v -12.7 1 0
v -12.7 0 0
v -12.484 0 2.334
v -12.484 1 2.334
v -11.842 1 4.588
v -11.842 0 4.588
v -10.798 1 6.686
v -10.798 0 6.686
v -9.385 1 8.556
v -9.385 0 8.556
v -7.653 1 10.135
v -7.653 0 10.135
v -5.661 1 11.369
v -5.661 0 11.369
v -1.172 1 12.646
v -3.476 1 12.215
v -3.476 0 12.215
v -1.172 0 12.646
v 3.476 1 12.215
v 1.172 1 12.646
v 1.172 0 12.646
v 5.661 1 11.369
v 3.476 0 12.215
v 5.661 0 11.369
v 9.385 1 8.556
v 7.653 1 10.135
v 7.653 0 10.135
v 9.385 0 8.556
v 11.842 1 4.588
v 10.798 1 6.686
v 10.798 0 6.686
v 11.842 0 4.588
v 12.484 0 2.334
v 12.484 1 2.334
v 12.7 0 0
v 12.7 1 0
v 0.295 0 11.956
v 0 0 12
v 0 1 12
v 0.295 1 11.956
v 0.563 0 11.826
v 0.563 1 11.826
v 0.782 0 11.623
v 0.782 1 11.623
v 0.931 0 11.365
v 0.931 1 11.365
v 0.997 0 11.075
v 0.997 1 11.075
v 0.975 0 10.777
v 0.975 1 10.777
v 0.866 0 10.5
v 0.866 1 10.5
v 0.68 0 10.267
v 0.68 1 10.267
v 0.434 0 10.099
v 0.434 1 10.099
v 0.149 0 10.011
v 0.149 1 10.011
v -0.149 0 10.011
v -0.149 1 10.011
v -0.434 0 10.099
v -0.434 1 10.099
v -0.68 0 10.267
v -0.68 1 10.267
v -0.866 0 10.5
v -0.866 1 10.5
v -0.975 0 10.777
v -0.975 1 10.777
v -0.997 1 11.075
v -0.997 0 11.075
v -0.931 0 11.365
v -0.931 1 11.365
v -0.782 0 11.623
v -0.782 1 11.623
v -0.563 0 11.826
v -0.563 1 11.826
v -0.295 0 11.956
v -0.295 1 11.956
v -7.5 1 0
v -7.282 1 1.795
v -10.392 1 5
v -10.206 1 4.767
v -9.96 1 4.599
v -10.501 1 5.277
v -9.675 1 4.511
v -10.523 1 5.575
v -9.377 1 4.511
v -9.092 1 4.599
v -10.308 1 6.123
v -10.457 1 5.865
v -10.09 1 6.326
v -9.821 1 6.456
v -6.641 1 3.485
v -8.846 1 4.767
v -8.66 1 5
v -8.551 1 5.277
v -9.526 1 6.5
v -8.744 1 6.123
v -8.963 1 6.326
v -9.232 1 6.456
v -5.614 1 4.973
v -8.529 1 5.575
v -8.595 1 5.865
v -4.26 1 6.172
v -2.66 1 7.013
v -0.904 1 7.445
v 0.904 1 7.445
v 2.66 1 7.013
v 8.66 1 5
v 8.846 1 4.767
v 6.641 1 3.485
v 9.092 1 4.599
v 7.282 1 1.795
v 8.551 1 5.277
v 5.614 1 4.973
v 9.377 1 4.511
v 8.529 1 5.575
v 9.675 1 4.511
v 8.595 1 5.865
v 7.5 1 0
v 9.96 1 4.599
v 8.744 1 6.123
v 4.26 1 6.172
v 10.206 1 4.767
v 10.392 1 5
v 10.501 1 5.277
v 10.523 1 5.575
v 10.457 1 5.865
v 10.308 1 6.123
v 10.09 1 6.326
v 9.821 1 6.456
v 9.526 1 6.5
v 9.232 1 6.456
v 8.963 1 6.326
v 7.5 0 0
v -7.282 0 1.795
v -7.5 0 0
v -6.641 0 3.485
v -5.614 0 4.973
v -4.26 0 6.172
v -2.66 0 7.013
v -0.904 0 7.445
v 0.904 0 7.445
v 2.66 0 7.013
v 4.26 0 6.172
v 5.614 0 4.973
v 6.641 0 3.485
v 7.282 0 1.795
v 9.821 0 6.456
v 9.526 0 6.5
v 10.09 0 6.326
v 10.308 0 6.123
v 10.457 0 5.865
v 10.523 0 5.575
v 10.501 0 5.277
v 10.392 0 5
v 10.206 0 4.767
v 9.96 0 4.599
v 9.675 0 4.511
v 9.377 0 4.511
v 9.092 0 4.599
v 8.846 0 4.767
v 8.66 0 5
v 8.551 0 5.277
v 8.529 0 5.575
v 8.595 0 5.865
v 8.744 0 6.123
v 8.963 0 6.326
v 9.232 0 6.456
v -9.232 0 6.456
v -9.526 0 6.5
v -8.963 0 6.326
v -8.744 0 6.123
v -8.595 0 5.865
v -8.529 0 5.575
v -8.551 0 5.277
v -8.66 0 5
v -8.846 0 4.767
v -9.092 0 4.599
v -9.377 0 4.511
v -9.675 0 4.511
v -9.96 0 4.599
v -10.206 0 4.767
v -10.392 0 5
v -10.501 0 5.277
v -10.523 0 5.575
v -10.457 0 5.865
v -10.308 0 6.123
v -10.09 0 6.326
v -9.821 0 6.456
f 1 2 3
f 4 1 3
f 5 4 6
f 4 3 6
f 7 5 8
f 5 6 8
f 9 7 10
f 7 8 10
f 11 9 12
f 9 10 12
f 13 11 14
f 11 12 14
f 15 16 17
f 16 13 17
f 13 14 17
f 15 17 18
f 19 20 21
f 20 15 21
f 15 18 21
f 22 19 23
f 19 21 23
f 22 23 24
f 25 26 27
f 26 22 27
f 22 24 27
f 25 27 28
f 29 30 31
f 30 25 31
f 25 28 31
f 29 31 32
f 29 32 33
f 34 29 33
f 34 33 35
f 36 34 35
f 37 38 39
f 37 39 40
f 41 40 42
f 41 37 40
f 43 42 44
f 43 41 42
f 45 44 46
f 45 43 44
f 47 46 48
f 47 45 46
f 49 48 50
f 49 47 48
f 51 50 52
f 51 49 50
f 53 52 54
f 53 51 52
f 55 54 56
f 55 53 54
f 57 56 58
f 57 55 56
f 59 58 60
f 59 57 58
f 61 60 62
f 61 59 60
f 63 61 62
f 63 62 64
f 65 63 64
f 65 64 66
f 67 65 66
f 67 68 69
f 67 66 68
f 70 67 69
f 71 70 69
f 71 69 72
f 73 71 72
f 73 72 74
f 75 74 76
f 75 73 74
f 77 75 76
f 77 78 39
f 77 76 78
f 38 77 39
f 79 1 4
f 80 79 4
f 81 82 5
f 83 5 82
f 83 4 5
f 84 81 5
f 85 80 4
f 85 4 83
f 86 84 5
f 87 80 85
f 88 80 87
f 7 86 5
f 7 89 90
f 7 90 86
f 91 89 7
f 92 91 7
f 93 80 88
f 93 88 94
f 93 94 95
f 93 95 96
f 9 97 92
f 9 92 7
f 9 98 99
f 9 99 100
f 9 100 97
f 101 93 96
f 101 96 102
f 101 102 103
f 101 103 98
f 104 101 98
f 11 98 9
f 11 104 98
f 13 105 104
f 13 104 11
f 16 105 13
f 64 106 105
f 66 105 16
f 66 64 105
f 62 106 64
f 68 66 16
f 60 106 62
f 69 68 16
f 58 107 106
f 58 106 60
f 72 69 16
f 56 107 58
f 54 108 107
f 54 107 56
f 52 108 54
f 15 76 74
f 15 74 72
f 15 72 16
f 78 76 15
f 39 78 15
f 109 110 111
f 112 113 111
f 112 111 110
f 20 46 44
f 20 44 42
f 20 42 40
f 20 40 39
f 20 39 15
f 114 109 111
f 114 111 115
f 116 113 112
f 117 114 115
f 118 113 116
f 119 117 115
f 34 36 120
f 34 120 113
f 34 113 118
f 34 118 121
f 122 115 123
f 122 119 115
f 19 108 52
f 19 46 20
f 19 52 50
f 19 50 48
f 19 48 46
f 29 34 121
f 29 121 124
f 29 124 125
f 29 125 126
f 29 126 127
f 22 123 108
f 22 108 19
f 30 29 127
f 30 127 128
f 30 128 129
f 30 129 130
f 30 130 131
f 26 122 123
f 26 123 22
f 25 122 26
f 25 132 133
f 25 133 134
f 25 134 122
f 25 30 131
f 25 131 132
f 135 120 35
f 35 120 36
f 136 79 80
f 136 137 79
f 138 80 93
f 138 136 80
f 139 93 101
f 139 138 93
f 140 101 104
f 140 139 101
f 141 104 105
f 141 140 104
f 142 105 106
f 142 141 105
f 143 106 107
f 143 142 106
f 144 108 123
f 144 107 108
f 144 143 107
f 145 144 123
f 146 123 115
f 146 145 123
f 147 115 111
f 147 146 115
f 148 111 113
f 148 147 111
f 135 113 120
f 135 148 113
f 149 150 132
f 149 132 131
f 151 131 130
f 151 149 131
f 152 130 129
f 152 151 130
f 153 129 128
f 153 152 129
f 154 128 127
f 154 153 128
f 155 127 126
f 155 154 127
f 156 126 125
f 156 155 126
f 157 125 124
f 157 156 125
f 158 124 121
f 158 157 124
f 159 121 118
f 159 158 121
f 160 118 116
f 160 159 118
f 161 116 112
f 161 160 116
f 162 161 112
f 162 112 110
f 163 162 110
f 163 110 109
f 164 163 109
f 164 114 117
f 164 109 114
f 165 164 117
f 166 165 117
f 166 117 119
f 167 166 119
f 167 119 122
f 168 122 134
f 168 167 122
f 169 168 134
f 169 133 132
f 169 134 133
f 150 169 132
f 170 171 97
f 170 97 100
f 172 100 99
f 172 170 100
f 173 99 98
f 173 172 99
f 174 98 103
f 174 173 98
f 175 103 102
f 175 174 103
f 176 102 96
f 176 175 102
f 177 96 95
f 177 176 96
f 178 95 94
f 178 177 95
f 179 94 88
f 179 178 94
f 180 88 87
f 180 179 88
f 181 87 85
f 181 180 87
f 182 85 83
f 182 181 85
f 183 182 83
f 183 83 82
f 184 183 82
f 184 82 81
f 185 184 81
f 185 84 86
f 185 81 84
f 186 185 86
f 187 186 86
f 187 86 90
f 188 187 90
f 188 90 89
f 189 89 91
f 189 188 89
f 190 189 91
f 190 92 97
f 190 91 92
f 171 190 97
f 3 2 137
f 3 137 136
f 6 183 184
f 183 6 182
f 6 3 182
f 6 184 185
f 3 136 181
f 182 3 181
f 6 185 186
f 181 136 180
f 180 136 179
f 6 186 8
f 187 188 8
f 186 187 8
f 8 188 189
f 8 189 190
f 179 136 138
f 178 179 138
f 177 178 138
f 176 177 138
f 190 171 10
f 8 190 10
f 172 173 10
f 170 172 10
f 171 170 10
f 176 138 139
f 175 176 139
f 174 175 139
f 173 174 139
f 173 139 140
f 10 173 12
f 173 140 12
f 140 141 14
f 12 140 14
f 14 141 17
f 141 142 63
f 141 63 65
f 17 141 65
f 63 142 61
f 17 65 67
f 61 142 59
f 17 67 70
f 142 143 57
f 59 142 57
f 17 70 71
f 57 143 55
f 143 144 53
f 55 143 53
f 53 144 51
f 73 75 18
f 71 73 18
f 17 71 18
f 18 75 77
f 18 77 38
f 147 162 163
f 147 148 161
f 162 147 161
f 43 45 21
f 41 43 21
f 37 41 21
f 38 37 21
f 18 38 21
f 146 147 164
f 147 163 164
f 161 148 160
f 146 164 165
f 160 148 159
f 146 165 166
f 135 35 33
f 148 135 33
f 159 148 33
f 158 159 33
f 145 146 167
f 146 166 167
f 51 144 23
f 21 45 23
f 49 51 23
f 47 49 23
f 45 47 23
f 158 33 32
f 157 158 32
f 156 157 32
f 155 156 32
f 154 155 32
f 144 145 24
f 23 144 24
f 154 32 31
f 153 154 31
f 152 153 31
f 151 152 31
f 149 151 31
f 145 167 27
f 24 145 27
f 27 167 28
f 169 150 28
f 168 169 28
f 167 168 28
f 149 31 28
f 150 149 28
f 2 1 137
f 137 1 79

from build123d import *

# Parameters (mm, degrees)
SKETCH1_R               = 12.7
BOSS_EXTRUDE1_DEPTH     = 1
CUT_EXTRUDE1_DEPTH      = 18.98832955
CUT_EXTRUDE1_DEPTH_BACK = 18.98832955
SKETCH19_R              = 1
CUT_EXTRUDE2_DEPTH      = 18.98832955
CUT_EXTRUDE2_DEPTH_BACK = 18.98832955
SKETCH20_R              = 7.5
SKETCH21_W              = 65.874202484
SKETCH21_H              = 51.979273979
CUT_EXTRUDE3_DEPTH      = 18.98832955


with BuildPart() as part:
    # Sketch1 → Boss-Extrude1 (new body)
    with BuildSketch(Plane(origin=(0, 0, 0), x_dir=(1, 0, 0), z_dir=(0, 1, 0))):
        with Locations(Location((0, 0, 0), (0, 0, 270))):
            Circle(SKETCH1_R)
    extrude(amount=BOSS_EXTRUDE1_DEPTH)

    # Sketch19 → Cut-Extrude1 (cut, two sides: drawn at the far end of the back side and taken through both)
    with BuildSketch(Plane(origin=(0, 1, 0), x_dir=(1, 0, 0), z_dir=(0, 1, 0)).offset(-CUT_EXTRUDE1_DEPTH_BACK)):
        with Locations(Location((0, 11, 0), (0, 0, 270))):
            Circle(SKETCH19_R)
        with Locations(Location((9.526279442, 5.5, 0), (0, 0, 270))):
            Circle(SKETCH19_R)
        with Locations(Location((9.526279442, -5.5, 0), (0, 0, 270))):
            Circle(SKETCH19_R)
        with Locations(Location((0, -11, 0), (0, 0, 270))):
            Circle(SKETCH19_R)
        with Locations(Location((-9.526279442, -5.5, 0), (0, 0, 270))):
            Circle(SKETCH19_R)
        with Locations(Location((-9.526279442, 5.5, 0), (0, 0, 270))):
            Circle(SKETCH19_R)
    extrude(amount=CUT_EXTRUDE1_DEPTH + CUT_EXTRUDE1_DEPTH_BACK, mode=Mode.SUBTRACT)

    # Sketch20 → Cut-Extrude2 (cut, two sides: drawn at the far end of the back side and taken through both)
    with BuildSketch(Plane(origin=(0, 1, 0), x_dir=(1, 0, 0), z_dir=(0, 1, 0)).offset(-CUT_EXTRUDE2_DEPTH_BACK)):
        with Locations(Location((0, 0, 0), (0, 0, 270))):
            Circle(SKETCH20_R)
    extrude(amount=CUT_EXTRUDE2_DEPTH + CUT_EXTRUDE2_DEPTH_BACK, mode=Mode.SUBTRACT)

    # Sketch21 → Cut-Extrude3 (cut, through all)
    with BuildSketch(Plane.XY):
        with Locations((-3.816154381, 6.321647006)):
            Rectangle(SKETCH21_W, SKETCH21_H)
    extrude(amount=-CUT_EXTRUDE3_DEPTH, mode=Mode.SUBTRACT)


solid = part.part
